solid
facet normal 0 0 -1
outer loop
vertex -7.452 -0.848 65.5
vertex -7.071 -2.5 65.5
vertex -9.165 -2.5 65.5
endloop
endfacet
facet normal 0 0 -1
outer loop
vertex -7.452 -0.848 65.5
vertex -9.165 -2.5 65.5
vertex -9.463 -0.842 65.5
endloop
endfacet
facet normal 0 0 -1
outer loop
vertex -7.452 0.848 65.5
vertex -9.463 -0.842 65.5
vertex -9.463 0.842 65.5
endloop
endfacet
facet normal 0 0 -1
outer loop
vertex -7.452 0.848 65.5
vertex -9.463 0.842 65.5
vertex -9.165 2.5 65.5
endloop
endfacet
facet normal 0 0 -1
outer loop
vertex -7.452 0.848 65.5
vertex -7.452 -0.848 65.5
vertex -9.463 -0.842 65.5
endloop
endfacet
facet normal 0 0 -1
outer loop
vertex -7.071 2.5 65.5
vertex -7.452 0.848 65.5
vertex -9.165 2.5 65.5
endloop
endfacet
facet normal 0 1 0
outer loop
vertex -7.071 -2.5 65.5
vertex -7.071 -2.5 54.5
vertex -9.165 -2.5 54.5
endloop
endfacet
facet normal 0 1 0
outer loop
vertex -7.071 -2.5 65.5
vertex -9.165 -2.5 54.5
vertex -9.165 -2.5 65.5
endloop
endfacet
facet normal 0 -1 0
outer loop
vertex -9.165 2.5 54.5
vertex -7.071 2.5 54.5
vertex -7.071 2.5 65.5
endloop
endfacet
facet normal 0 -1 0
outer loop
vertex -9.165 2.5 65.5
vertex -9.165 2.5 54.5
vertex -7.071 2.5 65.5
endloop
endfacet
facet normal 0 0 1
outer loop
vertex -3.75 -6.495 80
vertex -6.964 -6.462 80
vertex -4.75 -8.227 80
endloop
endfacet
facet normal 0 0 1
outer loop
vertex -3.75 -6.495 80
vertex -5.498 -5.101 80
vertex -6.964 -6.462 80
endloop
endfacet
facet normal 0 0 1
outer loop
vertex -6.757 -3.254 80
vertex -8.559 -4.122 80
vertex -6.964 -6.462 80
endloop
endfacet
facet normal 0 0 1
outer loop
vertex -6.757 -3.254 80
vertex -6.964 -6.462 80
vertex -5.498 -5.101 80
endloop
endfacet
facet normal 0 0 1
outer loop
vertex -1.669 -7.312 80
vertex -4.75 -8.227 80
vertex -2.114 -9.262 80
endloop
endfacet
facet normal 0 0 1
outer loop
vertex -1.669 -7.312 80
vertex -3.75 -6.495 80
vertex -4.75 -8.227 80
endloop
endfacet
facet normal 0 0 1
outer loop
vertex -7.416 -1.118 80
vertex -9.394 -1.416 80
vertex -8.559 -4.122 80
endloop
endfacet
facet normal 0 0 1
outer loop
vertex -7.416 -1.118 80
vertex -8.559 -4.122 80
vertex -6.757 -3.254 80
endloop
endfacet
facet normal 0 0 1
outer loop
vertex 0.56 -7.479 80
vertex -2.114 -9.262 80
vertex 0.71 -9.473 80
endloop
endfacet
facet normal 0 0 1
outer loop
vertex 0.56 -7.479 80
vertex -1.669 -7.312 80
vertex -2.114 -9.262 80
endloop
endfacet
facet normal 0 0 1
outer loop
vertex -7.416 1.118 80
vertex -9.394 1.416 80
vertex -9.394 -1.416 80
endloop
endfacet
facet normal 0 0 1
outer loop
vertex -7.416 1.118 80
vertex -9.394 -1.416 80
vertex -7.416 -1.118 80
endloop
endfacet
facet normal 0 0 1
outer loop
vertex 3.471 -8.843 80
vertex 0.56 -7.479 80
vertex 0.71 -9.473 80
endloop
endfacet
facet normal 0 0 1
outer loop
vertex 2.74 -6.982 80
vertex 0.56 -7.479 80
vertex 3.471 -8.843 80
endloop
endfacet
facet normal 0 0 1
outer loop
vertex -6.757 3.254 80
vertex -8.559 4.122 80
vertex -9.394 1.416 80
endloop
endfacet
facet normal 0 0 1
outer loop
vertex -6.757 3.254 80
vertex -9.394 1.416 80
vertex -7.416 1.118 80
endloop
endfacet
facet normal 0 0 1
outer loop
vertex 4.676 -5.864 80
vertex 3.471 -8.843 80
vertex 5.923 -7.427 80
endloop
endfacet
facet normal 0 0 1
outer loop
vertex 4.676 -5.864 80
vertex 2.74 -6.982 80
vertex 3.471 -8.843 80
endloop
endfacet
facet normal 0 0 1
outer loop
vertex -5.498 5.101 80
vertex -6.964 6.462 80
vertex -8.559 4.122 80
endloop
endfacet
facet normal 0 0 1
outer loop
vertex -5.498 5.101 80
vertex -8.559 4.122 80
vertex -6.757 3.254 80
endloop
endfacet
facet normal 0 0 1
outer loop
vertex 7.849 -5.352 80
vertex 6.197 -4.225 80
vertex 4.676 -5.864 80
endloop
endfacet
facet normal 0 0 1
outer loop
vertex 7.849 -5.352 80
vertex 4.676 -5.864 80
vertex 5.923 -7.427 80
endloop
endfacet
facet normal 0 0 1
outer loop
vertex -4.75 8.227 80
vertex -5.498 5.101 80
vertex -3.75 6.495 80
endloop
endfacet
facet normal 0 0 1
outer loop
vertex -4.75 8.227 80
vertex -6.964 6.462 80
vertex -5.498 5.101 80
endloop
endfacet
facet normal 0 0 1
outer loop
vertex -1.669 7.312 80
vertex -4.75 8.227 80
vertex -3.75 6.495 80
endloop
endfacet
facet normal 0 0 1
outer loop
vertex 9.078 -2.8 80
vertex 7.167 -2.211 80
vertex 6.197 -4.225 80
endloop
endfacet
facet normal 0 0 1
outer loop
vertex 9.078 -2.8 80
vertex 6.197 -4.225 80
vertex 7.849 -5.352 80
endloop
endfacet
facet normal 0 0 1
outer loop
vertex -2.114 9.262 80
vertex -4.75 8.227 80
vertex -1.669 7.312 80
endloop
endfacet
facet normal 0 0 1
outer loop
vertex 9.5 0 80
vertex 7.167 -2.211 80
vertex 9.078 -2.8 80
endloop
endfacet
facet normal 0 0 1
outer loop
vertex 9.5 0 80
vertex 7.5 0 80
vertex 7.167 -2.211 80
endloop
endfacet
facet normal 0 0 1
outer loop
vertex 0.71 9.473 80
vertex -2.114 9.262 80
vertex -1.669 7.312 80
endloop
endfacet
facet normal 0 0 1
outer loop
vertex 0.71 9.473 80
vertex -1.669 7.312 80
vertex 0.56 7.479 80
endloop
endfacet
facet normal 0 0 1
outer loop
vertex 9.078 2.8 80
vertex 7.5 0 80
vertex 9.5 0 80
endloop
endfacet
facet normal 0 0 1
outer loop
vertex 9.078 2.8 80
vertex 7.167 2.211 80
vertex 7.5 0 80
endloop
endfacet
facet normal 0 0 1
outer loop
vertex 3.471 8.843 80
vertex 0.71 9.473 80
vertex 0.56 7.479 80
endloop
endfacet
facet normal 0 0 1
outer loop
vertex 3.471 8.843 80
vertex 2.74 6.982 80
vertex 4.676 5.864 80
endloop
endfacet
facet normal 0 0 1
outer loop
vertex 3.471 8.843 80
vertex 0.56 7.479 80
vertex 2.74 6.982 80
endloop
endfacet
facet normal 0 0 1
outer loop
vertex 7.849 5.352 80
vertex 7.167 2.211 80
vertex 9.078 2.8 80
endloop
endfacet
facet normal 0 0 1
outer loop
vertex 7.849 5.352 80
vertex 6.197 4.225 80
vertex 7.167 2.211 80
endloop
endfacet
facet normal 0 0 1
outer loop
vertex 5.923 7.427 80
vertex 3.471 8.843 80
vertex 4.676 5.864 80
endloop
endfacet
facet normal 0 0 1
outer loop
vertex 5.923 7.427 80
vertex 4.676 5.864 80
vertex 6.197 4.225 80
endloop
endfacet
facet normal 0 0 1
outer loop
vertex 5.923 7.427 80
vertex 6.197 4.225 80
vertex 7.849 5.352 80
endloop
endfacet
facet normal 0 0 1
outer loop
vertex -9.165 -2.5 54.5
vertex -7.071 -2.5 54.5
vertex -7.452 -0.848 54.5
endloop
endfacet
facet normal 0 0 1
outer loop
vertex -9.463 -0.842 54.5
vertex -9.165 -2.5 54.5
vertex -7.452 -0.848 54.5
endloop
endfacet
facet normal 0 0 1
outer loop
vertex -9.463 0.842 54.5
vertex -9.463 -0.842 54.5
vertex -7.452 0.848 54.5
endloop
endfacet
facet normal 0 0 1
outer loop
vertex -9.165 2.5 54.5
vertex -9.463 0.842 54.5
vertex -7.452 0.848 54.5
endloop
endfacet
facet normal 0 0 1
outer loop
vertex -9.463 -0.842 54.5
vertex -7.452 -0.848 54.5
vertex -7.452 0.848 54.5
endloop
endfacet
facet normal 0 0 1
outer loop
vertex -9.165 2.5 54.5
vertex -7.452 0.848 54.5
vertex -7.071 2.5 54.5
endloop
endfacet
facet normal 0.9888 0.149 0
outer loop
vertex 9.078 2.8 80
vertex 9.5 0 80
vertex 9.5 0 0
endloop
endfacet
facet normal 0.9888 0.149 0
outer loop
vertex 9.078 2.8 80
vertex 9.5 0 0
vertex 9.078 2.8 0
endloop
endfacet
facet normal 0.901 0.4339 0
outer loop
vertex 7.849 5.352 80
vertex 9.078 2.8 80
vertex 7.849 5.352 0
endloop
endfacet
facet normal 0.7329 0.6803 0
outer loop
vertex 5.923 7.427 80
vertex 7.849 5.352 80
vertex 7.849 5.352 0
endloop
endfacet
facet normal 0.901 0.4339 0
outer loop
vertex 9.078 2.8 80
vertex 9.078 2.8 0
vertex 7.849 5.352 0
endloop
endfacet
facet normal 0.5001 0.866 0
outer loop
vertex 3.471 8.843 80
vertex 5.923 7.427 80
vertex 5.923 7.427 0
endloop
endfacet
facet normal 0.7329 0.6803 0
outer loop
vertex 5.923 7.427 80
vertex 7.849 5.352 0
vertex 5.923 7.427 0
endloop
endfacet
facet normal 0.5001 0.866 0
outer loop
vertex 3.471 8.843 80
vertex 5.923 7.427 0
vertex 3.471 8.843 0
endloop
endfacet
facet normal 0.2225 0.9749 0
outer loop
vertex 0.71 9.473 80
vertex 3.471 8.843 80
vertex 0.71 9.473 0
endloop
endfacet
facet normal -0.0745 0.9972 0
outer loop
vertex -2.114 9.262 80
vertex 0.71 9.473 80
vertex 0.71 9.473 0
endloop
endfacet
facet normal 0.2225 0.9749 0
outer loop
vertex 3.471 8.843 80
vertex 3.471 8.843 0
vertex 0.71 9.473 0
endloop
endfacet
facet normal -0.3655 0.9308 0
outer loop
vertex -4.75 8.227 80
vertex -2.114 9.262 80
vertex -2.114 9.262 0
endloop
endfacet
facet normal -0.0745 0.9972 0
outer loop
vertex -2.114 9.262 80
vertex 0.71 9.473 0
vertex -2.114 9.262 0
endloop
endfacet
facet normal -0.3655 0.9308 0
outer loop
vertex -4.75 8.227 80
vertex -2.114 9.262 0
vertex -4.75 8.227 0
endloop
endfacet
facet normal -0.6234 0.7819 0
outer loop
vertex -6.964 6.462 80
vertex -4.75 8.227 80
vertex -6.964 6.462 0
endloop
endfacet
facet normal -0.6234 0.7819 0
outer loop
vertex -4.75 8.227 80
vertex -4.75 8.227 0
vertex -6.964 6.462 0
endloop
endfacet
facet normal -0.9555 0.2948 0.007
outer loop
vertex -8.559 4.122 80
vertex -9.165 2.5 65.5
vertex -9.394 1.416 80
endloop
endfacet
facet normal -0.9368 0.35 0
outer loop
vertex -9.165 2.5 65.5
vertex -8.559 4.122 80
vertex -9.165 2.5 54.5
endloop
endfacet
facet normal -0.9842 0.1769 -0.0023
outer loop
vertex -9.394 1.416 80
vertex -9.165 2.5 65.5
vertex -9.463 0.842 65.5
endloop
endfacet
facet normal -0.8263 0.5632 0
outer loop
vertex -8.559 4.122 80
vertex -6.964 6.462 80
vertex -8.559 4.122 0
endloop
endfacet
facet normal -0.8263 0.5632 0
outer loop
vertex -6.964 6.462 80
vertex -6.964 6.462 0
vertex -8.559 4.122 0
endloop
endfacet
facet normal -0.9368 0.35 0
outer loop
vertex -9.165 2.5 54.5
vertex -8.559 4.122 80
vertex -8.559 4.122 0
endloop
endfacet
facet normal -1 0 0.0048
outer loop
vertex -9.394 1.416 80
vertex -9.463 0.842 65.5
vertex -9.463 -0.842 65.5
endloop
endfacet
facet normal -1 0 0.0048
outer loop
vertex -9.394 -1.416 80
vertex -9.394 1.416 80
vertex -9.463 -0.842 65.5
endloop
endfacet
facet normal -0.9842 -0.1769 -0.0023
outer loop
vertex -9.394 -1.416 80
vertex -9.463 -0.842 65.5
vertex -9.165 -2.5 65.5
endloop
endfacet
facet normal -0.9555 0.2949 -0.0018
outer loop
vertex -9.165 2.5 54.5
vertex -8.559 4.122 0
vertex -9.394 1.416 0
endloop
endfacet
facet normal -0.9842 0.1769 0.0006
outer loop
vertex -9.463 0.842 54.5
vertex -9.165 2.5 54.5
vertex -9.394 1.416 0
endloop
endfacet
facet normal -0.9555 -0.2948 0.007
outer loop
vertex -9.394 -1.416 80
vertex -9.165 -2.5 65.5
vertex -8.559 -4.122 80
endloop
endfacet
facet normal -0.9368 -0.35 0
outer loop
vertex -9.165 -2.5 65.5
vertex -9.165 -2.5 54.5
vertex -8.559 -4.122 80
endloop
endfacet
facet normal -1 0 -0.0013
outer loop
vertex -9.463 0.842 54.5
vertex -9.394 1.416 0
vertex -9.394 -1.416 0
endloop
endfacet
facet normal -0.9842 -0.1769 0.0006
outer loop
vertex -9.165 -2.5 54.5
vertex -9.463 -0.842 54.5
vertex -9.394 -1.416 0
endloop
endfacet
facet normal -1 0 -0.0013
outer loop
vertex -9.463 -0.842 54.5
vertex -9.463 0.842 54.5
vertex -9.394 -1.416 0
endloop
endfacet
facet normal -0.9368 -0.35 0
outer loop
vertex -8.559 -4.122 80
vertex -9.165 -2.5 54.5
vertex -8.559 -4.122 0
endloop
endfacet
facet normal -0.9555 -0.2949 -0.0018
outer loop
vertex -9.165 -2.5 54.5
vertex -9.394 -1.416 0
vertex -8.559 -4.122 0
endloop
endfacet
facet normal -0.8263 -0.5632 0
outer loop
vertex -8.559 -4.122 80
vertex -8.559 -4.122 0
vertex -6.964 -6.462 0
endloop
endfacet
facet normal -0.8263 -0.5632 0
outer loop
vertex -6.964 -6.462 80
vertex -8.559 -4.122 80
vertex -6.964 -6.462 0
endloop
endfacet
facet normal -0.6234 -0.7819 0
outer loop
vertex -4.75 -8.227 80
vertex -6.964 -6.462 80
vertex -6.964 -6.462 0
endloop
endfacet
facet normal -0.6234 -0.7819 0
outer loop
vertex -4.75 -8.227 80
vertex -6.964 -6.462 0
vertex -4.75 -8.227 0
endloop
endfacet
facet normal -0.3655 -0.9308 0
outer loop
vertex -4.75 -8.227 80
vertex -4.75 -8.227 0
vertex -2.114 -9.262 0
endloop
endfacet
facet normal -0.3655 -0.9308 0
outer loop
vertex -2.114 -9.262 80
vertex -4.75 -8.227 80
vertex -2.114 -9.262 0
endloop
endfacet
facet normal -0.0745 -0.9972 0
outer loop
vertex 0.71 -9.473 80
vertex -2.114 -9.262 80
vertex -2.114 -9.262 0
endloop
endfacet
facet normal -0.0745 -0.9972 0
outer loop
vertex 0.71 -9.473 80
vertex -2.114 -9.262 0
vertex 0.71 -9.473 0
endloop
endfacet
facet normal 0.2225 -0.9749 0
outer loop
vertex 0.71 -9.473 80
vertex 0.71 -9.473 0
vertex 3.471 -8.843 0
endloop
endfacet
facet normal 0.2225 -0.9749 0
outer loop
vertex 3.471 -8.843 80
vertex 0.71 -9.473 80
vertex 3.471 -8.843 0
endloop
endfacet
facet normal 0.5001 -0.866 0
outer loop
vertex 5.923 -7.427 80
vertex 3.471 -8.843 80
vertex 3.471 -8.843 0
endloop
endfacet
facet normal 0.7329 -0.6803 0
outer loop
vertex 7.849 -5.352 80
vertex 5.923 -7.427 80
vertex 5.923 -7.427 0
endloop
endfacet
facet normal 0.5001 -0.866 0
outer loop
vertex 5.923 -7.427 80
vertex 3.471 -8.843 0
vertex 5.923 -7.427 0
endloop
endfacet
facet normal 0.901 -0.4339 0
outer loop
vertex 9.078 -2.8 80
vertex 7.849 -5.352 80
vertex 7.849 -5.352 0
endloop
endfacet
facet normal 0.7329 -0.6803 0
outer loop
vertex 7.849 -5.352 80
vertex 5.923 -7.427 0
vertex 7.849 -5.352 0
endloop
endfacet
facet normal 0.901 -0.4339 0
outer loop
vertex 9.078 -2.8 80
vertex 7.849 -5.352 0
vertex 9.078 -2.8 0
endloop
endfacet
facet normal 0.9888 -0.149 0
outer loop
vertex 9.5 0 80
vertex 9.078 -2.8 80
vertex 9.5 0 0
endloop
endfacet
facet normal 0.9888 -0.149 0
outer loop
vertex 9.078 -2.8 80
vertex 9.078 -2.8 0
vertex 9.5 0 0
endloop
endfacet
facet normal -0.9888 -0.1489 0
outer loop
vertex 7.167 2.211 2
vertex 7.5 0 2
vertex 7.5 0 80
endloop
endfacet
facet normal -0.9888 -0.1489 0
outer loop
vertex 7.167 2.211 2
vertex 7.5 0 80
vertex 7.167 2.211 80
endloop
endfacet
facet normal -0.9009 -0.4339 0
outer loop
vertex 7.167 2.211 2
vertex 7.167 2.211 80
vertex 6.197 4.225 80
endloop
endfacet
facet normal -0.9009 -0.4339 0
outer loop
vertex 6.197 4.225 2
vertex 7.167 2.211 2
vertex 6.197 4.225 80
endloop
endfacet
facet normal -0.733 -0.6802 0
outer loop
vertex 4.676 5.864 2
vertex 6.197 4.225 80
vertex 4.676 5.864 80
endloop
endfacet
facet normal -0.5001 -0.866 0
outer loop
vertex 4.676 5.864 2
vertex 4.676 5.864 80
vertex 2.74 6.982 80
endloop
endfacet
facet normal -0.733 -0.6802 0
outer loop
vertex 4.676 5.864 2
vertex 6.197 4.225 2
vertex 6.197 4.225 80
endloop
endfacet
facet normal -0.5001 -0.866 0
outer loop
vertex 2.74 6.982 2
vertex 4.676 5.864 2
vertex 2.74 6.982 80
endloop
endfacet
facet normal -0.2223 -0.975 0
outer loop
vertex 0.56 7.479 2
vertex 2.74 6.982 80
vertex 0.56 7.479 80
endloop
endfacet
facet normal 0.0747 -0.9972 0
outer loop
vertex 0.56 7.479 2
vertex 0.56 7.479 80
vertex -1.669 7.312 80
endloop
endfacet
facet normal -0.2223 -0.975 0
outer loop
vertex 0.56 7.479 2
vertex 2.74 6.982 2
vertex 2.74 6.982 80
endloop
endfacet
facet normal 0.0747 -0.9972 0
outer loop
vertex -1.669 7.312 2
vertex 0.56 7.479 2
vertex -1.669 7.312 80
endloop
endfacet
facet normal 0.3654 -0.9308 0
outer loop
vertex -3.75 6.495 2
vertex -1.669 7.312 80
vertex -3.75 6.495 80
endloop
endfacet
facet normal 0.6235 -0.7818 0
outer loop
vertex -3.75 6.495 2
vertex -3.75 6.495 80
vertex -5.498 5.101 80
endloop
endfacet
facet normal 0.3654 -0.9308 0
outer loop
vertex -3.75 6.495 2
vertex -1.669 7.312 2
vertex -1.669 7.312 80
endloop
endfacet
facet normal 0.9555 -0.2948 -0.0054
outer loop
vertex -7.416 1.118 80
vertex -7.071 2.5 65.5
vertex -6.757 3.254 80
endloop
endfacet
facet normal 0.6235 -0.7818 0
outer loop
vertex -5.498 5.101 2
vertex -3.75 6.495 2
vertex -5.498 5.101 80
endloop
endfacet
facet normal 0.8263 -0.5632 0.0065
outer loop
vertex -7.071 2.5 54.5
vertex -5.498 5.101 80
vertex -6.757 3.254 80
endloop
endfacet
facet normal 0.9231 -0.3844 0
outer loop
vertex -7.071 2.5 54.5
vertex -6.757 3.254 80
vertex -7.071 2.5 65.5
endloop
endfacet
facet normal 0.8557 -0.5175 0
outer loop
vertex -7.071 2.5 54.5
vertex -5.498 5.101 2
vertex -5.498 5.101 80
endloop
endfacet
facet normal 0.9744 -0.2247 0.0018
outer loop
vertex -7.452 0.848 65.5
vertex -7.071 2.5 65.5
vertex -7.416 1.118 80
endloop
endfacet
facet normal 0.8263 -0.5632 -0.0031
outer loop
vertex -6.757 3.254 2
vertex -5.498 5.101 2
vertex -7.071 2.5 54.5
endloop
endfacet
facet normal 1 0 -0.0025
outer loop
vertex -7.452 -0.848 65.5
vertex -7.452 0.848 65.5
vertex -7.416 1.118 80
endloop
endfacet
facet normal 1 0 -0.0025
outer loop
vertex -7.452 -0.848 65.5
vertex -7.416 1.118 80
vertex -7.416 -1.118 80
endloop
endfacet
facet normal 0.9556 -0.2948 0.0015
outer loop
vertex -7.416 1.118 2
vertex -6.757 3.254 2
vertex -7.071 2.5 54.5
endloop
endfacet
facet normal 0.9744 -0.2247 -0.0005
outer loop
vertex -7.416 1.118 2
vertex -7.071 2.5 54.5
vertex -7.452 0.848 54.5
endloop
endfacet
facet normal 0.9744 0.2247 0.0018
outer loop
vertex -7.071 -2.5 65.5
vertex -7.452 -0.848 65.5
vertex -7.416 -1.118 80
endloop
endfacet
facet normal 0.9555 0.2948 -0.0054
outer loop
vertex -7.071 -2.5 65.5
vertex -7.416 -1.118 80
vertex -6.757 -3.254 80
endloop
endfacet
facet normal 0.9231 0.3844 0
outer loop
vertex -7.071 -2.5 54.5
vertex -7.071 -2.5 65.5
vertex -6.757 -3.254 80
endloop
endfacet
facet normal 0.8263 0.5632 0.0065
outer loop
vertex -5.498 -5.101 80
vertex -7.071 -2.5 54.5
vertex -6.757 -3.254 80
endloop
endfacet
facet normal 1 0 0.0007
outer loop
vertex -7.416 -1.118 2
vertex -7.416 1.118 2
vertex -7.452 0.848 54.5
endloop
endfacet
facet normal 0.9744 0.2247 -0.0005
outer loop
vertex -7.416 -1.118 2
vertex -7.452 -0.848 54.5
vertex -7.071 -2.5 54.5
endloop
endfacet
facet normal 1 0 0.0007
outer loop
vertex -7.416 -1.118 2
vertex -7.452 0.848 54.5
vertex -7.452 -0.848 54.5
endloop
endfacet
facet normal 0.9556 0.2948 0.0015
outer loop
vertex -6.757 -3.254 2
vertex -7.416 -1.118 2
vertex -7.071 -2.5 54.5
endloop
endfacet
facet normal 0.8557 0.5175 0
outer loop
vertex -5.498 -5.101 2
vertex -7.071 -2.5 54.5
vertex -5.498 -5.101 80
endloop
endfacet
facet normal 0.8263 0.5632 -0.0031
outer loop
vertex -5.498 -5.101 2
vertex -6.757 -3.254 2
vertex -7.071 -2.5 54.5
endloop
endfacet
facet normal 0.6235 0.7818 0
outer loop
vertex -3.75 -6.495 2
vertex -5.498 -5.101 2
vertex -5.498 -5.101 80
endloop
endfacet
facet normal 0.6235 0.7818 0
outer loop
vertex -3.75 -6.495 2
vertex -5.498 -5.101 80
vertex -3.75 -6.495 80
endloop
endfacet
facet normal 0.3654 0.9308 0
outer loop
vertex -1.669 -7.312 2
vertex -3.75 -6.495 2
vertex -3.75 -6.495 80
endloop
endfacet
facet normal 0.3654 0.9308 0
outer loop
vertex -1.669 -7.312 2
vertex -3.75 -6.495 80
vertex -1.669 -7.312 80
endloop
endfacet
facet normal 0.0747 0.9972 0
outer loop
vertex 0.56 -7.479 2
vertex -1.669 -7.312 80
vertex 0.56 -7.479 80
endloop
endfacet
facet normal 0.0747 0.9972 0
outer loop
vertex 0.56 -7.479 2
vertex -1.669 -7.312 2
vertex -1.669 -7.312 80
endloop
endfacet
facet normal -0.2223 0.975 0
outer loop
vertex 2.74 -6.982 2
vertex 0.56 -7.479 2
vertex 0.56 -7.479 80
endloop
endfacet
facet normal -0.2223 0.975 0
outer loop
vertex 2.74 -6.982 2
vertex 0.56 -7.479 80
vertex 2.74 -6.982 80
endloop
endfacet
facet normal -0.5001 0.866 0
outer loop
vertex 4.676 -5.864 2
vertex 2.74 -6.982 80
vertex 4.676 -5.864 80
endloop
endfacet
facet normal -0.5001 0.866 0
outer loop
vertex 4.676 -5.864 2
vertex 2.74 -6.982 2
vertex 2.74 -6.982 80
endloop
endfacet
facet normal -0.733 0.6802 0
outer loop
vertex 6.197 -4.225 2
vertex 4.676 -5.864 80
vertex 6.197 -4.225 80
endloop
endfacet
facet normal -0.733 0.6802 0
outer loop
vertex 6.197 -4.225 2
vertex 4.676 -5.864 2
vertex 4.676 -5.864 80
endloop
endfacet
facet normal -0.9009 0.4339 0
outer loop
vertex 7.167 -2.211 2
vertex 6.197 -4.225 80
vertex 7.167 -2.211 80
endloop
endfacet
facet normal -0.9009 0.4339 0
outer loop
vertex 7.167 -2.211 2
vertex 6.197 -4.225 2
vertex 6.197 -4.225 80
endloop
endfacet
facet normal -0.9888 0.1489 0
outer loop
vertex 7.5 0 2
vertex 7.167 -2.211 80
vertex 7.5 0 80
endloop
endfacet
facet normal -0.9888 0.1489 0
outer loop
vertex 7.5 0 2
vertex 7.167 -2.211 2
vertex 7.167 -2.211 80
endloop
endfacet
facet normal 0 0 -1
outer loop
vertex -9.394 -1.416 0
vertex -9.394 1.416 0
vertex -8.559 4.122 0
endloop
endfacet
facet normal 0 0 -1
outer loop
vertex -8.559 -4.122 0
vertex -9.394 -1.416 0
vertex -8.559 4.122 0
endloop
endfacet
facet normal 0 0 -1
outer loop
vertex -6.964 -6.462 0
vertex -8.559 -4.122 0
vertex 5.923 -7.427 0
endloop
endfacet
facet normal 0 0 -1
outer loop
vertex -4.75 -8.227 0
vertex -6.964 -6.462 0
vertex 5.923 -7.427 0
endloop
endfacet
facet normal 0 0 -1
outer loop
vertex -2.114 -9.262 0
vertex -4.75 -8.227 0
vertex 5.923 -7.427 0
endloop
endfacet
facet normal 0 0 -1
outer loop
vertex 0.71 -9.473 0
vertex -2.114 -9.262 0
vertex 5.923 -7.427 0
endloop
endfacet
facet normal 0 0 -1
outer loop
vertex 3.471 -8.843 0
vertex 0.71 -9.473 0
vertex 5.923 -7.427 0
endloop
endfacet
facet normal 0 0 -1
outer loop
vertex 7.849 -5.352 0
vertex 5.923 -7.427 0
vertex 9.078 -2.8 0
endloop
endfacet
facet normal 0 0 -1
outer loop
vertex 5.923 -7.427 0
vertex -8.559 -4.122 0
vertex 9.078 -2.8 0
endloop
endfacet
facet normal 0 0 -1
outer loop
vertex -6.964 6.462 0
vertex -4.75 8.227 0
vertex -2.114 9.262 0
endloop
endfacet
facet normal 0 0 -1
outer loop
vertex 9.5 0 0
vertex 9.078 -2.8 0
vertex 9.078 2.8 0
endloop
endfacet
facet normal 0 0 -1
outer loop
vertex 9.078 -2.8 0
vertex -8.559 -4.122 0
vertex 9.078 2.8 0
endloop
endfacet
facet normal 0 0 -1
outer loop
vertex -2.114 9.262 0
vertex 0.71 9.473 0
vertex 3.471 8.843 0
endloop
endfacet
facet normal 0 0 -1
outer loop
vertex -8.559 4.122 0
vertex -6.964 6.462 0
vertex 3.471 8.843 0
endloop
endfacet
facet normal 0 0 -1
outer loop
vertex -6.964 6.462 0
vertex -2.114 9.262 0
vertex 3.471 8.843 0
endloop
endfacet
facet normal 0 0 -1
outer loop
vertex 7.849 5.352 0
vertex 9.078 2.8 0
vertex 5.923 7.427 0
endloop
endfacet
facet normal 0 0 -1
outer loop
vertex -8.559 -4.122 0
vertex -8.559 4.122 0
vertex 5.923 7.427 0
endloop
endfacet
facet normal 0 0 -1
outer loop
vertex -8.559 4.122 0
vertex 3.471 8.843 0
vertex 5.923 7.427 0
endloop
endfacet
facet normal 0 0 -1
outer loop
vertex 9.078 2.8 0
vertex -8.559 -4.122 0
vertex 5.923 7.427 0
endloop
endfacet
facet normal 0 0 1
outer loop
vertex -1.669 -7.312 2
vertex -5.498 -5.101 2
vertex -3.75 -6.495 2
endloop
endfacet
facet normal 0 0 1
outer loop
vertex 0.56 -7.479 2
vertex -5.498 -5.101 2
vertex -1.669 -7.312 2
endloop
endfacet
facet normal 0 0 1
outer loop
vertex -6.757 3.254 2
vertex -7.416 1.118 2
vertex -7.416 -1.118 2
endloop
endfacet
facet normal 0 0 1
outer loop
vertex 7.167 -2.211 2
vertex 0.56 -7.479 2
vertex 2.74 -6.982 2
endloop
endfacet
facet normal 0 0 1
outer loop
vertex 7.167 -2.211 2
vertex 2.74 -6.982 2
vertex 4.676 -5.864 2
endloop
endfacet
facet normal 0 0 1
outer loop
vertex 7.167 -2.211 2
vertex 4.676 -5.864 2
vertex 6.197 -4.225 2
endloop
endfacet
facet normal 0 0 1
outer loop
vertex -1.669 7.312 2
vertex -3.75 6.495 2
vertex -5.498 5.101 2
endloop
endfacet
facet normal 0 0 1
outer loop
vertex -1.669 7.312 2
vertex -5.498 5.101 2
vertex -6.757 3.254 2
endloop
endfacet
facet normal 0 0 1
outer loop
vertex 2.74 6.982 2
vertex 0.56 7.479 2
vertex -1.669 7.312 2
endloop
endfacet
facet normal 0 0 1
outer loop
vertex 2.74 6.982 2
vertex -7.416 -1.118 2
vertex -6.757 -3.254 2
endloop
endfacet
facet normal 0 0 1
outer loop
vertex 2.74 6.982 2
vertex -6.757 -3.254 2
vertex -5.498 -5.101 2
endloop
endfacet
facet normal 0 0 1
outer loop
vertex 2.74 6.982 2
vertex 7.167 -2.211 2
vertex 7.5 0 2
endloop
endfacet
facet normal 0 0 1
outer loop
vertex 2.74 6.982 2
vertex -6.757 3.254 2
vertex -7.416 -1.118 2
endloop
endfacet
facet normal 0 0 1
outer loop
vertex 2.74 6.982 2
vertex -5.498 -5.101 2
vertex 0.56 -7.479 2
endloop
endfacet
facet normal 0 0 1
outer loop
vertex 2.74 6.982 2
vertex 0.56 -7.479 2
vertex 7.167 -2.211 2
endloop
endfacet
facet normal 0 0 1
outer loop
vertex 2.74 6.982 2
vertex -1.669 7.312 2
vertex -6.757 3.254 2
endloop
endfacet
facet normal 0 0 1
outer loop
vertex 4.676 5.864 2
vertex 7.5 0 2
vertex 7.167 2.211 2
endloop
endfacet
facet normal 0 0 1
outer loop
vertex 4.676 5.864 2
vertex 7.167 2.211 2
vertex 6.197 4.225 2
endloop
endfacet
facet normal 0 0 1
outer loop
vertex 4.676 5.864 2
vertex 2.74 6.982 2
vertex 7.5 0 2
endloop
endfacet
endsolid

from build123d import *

# Parameters (mm, degrees)
F0_R     = 9.5
F0_R_2   = 7.5
F1_DEPTH = 80
F2_W     = 5
F2_H     = 11
F3_DEPTH = 25
F4_DEPTH = 2


with BuildPart() as f1:
    # F0 (on Top) → F1 (new body)
    with BuildSketch(Plane.XY):
        Circle(F0_R)
        Circle(F0_R_2, mode=Mode.SUBTRACT)
    extrude(amount=F1_DEPTH)

    # F2 (on Right) → F3 (cut)
    with BuildSketch(Plane.YZ):
        with Locations((0, 60)):
            Rectangle(F2_W, F2_H)
    extrude(amount=-F3_DEPTH, mode=Mode.SUBTRACT)

    # F0 (on Top) → F4 (join)
    with BuildSketch(Plane.XY):
        Circle(F0_R_2)
    extrude(amount=F4_DEPTH)


solid = f1.part
